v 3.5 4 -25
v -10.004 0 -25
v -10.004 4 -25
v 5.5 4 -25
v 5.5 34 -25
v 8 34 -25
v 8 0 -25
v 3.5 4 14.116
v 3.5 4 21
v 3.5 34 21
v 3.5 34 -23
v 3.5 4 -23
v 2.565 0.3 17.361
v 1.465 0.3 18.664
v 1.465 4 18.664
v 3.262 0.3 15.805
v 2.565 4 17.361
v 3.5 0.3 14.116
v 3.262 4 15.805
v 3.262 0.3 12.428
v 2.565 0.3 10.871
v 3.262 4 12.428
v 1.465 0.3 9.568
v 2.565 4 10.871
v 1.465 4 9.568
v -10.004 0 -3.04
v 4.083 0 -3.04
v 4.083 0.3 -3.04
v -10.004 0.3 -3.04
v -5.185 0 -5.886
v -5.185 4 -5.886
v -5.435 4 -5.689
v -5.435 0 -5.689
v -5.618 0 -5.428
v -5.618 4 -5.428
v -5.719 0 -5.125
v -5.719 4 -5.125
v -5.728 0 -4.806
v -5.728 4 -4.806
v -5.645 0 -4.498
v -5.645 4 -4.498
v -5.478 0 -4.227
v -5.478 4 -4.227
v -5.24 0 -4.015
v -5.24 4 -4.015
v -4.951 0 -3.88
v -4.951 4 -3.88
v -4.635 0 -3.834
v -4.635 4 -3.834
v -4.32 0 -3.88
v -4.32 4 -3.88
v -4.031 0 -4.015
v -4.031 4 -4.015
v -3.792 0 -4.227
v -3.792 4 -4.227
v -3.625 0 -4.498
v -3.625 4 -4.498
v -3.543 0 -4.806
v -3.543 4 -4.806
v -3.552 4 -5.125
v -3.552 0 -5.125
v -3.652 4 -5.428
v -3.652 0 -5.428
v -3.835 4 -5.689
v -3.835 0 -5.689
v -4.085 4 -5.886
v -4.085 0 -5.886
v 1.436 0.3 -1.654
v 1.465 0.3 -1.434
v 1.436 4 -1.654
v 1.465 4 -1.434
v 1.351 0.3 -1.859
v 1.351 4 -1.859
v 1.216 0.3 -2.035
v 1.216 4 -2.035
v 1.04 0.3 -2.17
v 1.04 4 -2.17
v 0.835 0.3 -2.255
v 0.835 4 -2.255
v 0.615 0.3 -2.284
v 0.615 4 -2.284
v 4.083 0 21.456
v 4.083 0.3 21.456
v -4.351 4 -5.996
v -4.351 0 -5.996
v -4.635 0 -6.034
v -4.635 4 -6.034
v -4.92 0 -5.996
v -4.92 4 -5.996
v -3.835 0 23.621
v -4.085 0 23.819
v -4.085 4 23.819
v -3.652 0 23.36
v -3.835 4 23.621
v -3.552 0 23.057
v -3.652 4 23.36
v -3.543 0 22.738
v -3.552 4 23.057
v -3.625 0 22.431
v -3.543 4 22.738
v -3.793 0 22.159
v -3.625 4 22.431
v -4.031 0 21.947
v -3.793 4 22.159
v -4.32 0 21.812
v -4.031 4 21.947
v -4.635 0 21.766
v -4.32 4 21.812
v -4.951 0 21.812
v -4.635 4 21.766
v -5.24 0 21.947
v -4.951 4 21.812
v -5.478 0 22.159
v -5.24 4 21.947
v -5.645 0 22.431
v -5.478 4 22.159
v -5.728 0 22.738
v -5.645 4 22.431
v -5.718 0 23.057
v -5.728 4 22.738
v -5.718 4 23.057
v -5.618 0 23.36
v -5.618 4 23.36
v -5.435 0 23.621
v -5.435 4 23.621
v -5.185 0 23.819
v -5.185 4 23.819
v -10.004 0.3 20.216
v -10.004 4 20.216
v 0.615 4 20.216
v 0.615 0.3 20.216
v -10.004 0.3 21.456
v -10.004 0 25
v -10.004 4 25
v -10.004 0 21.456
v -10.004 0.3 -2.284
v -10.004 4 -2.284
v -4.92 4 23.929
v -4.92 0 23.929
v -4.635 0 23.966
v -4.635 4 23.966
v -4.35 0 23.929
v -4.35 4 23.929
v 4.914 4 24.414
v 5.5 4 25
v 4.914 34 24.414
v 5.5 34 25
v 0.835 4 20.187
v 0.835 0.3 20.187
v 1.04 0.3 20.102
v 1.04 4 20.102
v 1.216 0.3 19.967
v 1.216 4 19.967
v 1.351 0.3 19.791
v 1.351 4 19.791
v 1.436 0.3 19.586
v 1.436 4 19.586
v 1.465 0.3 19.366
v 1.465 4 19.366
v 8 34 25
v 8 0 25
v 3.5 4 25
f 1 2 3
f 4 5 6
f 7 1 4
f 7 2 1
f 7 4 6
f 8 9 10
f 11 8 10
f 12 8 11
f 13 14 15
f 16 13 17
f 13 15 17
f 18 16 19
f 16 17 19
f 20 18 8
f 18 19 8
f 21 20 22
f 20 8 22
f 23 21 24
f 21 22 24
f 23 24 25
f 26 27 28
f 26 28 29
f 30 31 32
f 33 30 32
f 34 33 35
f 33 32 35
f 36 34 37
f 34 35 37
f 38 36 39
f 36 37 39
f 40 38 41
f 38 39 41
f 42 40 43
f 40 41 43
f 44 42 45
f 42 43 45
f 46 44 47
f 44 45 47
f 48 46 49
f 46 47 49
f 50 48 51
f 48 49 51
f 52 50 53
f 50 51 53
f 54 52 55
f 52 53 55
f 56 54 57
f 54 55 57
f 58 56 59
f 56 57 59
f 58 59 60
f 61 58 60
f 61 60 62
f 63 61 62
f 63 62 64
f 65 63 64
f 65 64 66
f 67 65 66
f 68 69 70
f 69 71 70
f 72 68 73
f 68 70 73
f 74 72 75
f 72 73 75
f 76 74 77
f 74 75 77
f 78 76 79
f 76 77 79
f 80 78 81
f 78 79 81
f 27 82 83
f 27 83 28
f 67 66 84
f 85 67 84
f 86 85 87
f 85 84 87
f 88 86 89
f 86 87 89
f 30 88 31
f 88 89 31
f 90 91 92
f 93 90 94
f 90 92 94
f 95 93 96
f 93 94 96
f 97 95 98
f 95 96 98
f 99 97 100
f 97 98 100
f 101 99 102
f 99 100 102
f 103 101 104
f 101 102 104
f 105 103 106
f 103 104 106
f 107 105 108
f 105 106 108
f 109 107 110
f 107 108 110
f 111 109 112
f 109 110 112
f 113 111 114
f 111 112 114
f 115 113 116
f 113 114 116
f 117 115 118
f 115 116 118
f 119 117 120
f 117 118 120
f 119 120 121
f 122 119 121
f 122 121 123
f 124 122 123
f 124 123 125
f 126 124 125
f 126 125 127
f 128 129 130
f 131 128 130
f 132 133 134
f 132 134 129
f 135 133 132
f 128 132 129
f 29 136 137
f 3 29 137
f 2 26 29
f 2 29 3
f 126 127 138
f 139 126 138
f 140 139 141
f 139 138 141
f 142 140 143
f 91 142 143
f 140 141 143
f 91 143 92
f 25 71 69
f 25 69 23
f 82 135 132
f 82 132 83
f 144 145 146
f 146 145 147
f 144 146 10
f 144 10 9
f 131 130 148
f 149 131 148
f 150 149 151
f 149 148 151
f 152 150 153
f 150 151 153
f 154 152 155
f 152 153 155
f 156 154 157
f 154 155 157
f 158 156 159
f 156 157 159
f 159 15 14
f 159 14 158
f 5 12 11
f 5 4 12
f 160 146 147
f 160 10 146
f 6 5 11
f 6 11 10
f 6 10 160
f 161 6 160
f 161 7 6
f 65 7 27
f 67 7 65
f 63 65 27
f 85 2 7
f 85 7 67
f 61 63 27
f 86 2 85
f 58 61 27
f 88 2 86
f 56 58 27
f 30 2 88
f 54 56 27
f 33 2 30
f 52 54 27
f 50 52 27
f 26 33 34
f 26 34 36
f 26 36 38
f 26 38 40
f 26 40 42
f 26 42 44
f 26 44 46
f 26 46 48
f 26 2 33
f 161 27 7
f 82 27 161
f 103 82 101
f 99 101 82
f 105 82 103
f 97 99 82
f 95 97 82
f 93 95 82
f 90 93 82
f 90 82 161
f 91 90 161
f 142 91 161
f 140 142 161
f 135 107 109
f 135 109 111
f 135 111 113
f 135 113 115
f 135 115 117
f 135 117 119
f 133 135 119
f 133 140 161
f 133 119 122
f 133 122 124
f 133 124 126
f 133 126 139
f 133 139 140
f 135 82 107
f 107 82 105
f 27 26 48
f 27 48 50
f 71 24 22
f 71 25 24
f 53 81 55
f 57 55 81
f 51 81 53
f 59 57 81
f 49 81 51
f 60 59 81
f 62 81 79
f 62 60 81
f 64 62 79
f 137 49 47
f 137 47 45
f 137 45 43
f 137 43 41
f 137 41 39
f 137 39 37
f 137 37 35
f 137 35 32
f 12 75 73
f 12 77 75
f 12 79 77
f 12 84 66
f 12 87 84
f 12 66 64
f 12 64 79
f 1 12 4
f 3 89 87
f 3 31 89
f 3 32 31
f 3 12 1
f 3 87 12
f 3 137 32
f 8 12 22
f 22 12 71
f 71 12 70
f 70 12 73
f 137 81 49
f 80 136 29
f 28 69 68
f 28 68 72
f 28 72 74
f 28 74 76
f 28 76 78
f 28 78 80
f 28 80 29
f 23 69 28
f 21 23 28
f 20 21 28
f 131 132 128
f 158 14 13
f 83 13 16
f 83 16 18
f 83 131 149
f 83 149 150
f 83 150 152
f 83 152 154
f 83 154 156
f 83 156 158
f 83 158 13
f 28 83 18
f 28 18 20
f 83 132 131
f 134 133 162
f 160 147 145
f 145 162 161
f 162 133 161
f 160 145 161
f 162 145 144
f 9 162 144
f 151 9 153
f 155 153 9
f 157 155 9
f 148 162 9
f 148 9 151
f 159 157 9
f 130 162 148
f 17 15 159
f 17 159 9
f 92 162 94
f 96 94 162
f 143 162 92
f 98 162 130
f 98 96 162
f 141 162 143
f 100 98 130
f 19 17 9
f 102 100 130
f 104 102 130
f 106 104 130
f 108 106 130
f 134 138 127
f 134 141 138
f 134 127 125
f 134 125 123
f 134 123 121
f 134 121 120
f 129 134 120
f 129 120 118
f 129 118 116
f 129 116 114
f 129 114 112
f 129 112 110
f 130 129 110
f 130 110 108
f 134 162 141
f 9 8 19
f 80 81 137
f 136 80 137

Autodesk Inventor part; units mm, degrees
ref_plane "YZ Plane" through (0, 0, 0) normal (1, 0, 0) x (0, 1, 0)
ref_plane "XZ Plane" through (0, 0, 0) normal (0, 1, 0) x (-1, 0, 0)
ref_plane "XY Plane" through (0, 0, 0) normal (0, 0, 1) x (1, 0, 0)
sketch "Эскиз1" plane through (0, 0, 0) normal (0, 1, 0) x (-1, 0, 0)
  line L0 (0, 0) -> (0, -20)
  circle A0 centre (0, -20) radius 2
  line L1 (-3.5, 25) -> (3.5, 25)
  line L2 (3.5, 25) -> (3.5, -25)
  line L3 (3.5, -25) -> (-3.5, -25)
  line L4 (-3.5, -25) -> (-3.5, 25)
  line L5 (-3.5, 25) -> (3.5, -25) construction
  line L6 (3.5, 25) -> (-3.5, -25) construction
  line L7 (0, 0) -> (0, 20)
  circle A1 centre (0, 20) radius 2
  dimension "d0" = 20
  dimension "d1" = 4
  dimension "d2" = 7
  dimension "d3" = 50
  dimension "d4" = 20
  dimension "d5" = 4
extrude "Выдавливание1" add sketch "Эскиз1" along normal blind 4 contours A0 | L1 L2 L3 L4 | A1
sketch "Эскиз2" plane through (3.5, 0, 25) normal (1, 0, 0) x (0, 0, -1)
  line L0 (50, 0) -> (0, 0) projected
  line L1 (0, 4) -> (50, 4)
  line L2 (50, 4) -> (50, 0)
  line L3 (50, 0) -> (0, 0)
  line L4 (0, 0) -> (0, 4)
  point P0 (25, 0)
extrude "Выдавливание2" add sketch "Эскиз2" along normal blind 7
sketch "Эскиз3" plane through (0, 4, 0) normal (0, 1, 0) x (1, 0, 0)
  line L0 (-3.5, -25) -> (10.5, -25) projected
  line L1 (-3.5, 25) -> (10.5, 25) projected
  line L2 (10.5, -25) -> (3.5, -25)
  line L3 (3.5, -25) -> (3.5, 25)
  line L4 (3.5, 25) -> (10.5, 25)
  line L5 (10.5, 25) -> (10.5, -25)
  point P0 (0, 0)
  dimension "d10" = 7
extrude "Выдавливание3" add sketch "Эскиз3" along normal blind 30
sketch "Эскиз5" plane through (0, 4, 0) normal (0, 1, 0) x (1, 0, 0)
  line L0 (-7.5352, -8.6362) -> (-7.5352, -8.5162)
  arc A0 (-1.7352, -8.5162) -> (-7.5352, -8.5162) centre (-4.6352, -8.5162) ccw
  line L1 (-1.7352, -8.5162) -> (-1.7352, -8.6362)
  arc A1 (1.3648, -12.5541) -> (-1.7352, -8.6362) centre (-4.6352, -14.1162) ccw
  line L2 (1.3648, -12.5541) -> (1.3648, 1.4338)
  arc A2 (1.3648, 1.4338) -> (0.6148, 2.1838) centre (0.6148, 1.4338) ccw
  line L3 (0.6148, 2.1838) -> (-9.8852, 2.1838)
  arc A3 (-9.8852, 2.1838) -> (-10.6352, 1.4338) centre (-9.8852, 1.4338) ccw
  line L4 (-10.6352, 1.4338) -> (-10.6352, -12.5541)
  arc A4 (-7.5352, -8.6362) -> (-10.6352, -12.5541) centre (-4.6352, -14.1162) ccw
  line L5 (0.4648, -4.2162) -> (0.4648, 0.7838)
  arc A5 (-0.0352, -4.7162) -> (0.4648, -4.2162) centre (-0.0352, -4.2162) ccw
  line L6 (-9.2352, -4.7162) -> (-0.0352, -4.7162)
  arc A6 (-9.7352, -4.2162) -> (-9.2352, -4.7162) centre (-9.2352, -4.2162) ccw
  line L7 (-9.7352, 0.7838) -> (-9.7352, -4.2162)
  arc A7 (-9.2352, 1.2838) -> (-9.7352, 0.7838) centre (-9.2352, 0.7838) ccw
  line L8 (-0.0352, 1.2838) -> (-9.2352, 1.2838)
  arc A8 (0.4648, 0.7838) -> (-0.0352, 1.2838) centre (-0.0352, 0.7838) ccw
  arc A9 (-5.1852, 5.8865) -> (-4.0852, 5.8865) centre (-4.6352, 4.9338) ccw
  line L9 (-5.1852, 7.0838) -> (-5.1852, 5.8865)
  line L10 (-5.1852, 7.0838) -> (-9.8852, 7.0838)
  arc A10 (-9.8852, 7.0838) -> (-10.7352, 6.2338) centre (-9.8852, 6.2338) ccw
  line L11 (-10.7352, 6.2338) -> (-10.7352, 1.4338)
  arc A11 (-9.8852, 2.2838) -> (-10.7352, 1.4338) centre (-9.8852, 1.4338) ccw
  line L12 (0.6148, 2.2838) -> (-9.8852, 2.2838)
  arc A12 (1.4648, 1.4338) -> (0.6148, 2.2838) centre (0.6148, 1.4338) ccw
  line L13 (1.4648, 1.4338) -> (1.4648, 6.2338)
  arc A13 (1.4648, 6.2338) -> (0.6148, 7.0838) centre (0.6148, 6.2338) ccw
  line L14 (0.6148, 7.0838) -> (-4.0852, 7.0838)
  line L15 (-4.0852, 5.8865) -> (-4.0852, 7.0838)
  line L16 (-9.8852, -25.0162) -> (-5.1852, -25.0162)
  line L17 (-5.1852, -23.8188) -> (-5.1852, -25.0162)
  arc A14 (-4.0852, -23.8188) -> (-5.1852, -23.8188) centre (-4.6352, -22.8662) ccw
  line L18 (-4.0852, -25.0162) -> (-4.0852, -23.8188)
  line L19 (-4.0852, -25.0162) -> (0.6148, -25.0162)
  arc A15 (0.6148, -25.0162) -> (1.4648, -24.1662) centre (0.6148, -24.1662) ccw
  line L20 (1.4648, -24.1662) -> (1.4648, -19.3662)
  arc A16 (0.6148, -20.2162) -> (1.4648, -19.3662) centre (0.6148, -19.3662) ccw
  line L21 (-9.8852, -20.2162) -> (0.6148, -20.2162)
  arc A17 (-10.7352, -19.3662) -> (-9.8852, -20.2162) centre (-9.8852, -19.3662) ccw
  line L22 (-10.7352, -19.3662) -> (-10.7352, -24.1662)
  arc A18 (-10.7352, -24.1662) -> (-9.8852, -25.0162) centre (-9.8852, -24.1662) ccw
  line L23 (-10.7352, -19.3662) -> (-10.7352, -15.6782)
  line L24 (-10.7352, -12.5541) -> (-10.7352, -14.1162)
  line L25 (-10.7352, -14.1162) -> (-10.7352, -15.6782)
  line L26 (-10.7352, -12.5541) -> (-10.7352, 1.4338)
  line L27 (1.4648, 1.4338) -> (1.4648, -12.5541)
  line L28 (1.4648, -15.6782) -> (1.4648, -19.3662)
  line L29 (1.4648, -15.6782) -> (1.4648, -14.1162)
  line L30 (1.4648, -14.1162) -> (1.4648, -12.5541)
  arc A19 (-10.6352, -15.6782) -> (-6.1972, -20.1162) centre (-4.6352, -14.1162) ccw
  line L31 (-10.6352, -15.6782) -> (-10.6352, -19.3662)
  arc A20 (-10.6352, -19.3662) -> (-9.8852, -20.1162) centre (-9.8852, -19.3662) ccw
  line L32 (-9.8852, -20.1162) -> (-6.1972, -20.1162)
  line L33 (1.3648, -19.3662) -> (1.3648, -15.6782)
  arc A21 (-3.0731, -20.1162) -> (1.3648, -15.6782) centre (-4.6352, -14.1162) ccw
  line L34 (-3.0731, -20.1162) -> (0.6148, -20.1162)
  arc A22 (0.6148, -20.1162) -> (1.3648, -19.3662) centre (0.6148, -19.3662) ccw
  circle A23 centre (-4.6352, 4.9338) radius 1.1
  line L35 (-5.1852, 5.8865) -> (-5.1852, 7.0838)
  line L36 (-4.0852, 7.0838) -> (-5.1852, 7.0838)
  circle A24 centre (-4.6352, -22.8662) radius 1.1
  line L37 (-5.1852, -25.0162) -> (-5.1852, -23.8188)
  line L38 (-4.0852, -25.0162) -> (-5.1852, -25.0162)
  circle A25 centre (-4.6352, -14.1162) radius 0.8
  line L39 (-3.5, 25) -> (3.5, 25) projected
  line L40 (-13.5, 25) -> (-13.5, -25)
  line L41 (-13.5, -25) -> (-3.5, -25)
  line L42 (-3.5, -25) -> (-3.5, 25)
  point P0 (0, 0)
  point P1 (-4.6352, -8.9662)
  dimension "d16" = 10
extrude "Выдавливание5" cut sketch "Эскиз5" against normal blind 10 contours A4 L4 A3 L3 L42 L8 A7 L7 A6 L6 A0 L0 | L0 A0 L42 L21 A17 L23 L25 L24 L26 A11 L12 L3 A3 L4 A4 | L42 L6 A5 L5 A8 L8 L3 A2 L2 A1 L1 A0 | A0 L1 A1 L2 A2 L3 L42 L12 A12 L27 L30 L29 L28 A16 L21 | L42 L8 A8 L5 A5 L6 | L6 A6 L7 A7 L8 L42 | A19 L32 A20 L31 | A22 L34 A21 L33 | A25
move faces "Перенос1" translate (-6.504, 0, 0) faces at (-3.5, 2.6667, -9.8559) (-3.5, 1.3333, 23.4054)
sketch "Эскиз6" plane through (0, 4, 0) normal (0, 1, 0) x (1, 0, 0)
  arc A0 (1.4648, -18.6645) -> (1.4648, -9.5679) centre (-2.6, -14.1162) ccw
  line L0 (1.4648, -9.5679) -> (1.4648, -19.3662)
  point P0 (0, 0)
  point P1 (0.2532, -8.7246)
  point P2 (-5.4532, -8.7246)
extrude "Выдавливание6" cut sketch "Эскиз6" against normal blind 7
sketch "Эскиз7" plane through (0, 0, 0) normal (0, -1, 0) x (1, 0, 0)
  line L0 (-10.004, 25) -> (-10.004, 20.2162) projected
  line L1 (-10.004, 21.4561) -> (4.0826, 21.4561)
  line L2 (4.0826, 21.4561) -> (4.0826, -3.0396)
  line L3 (4.0826, -3.0396) -> (-10.004, -3.0396)
  line L4 (-10.004, -3.0396) -> (-10.004, 21.4561)
  point P0 (0, 0)
extrude "Выдавливание7" cut sketch "Эскиз7" against normal blind 0.3
sketch "Эскиз8" plane through (0, 4, 0) normal (0, 1, 0) x (1, 0, 0)
  line L0 (-7.5352, -8.6362) -> (-7.5352, -8.5162)
  arc A0 (-1.7352, -8.5162) -> (-7.5352, -8.5162) centre (-4.6352, -8.5162) ccw
  line L1 (-1.7352, -8.5162) -> (-1.7352, -8.6362)
  arc A1 (1.3648, -12.5541) -> (-1.7352, -8.6362) centre (-4.6352, -14.1162) ccw
  line L2 (1.3648, -12.5541) -> (1.3648, 1.4338)
  arc A2 (1.3648, 1.4338) -> (0.6148, 2.1838) centre (0.6148, 1.4338) ccw
  line L3 (0.6148, 2.1838) -> (-9.8852, 2.1838)
  arc A3 (-9.8852, 2.1838) -> (-10.6352, 1.4338) centre (-9.8852, 1.4338) ccw
  line L4 (-10.6352, 1.4338) -> (-10.6352, -12.5541)
  arc A4 (-7.5352, -8.6362) -> (-10.6352, -12.5541) centre (-4.6352, -14.1162) ccw
  line L5 (0.4648, -4.2162) -> (0.4648, 0.7838)
  arc A5 (-0.0352, -4.7162) -> (0.4648, -4.2162) centre (-0.0352, -4.2162) ccw
  line L6 (-9.2352, -4.7162) -> (-0.0352, -4.7162)
  arc A6 (-9.7352, -4.2162) -> (-9.2352, -4.7162) centre (-9.2352, -4.2162) ccw
  line L7 (-9.7352, 0.7838) -> (-9.7352, -4.2162)
  arc A7 (-9.2352, 1.2838) -> (-9.7352, 0.7838) centre (-9.2352, 0.7838) ccw
  line L8 (-0.0352, 1.2838) -> (-9.2352, 1.2838)
  arc A8 (0.4648, 0.7838) -> (-0.0352, 1.2838) centre (-0.0352, 0.7838) ccw
  arc A9 (-5.1852, 5.8865) -> (-4.0852, 5.8865) centre (-4.6352, 4.9338) ccw
  line L9 (-5.1852, 7.0838) -> (-5.1852, 5.8865)
  line L10 (-5.1852, 7.0838) -> (-9.8852, 7.0838)
  arc A10 (-9.8852, 7.0838) -> (-10.7352, 6.2338) centre (-9.8852, 6.2338) ccw
  line L11 (-10.7352, 6.2338) -> (-10.7352, 1.4338)
  arc A11 (-9.8852, 2.2838) -> (-10.7352, 1.4338) centre (-9.8852, 1.4338) ccw
  line L12 (0.6148, 2.2838) -> (-9.8852, 2.2838)
  arc A12 (1.4648, 1.4338) -> (0.6148, 2.2838) centre (0.6148, 1.4338) ccw
  line L13 (1.4648, 1.4338) -> (1.4648, 6.2338)
  arc A13 (1.4648, 6.2338) -> (0.6148, 7.0838) centre (0.6148, 6.2338) ccw
  line L14 (0.6148, 7.0838) -> (-4.0852, 7.0838)
  line L15 (-4.0852, 5.8865) -> (-4.0852, 7.0838)
  line L16 (-9.8852, -25.0162) -> (-5.1852, -25.0162)
  line L17 (-5.1852, -23.8188) -> (-5.1852, -25.0162)
  arc A14 (-4.0852, -23.8188) -> (-5.1852, -23.8188) centre (-4.6352, -22.8662) ccw
  line L18 (-4.0852, -25.0162) -> (-4.0852, -23.8188)
  line L19 (-4.0852, -25.0162) -> (0.6148, -25.0162)
  arc A15 (0.6148, -25.0162) -> (1.4648, -24.1662) centre (0.6148, -24.1662) ccw
  line L20 (1.4648, -24.1662) -> (1.4648, -19.3662)
  arc A16 (0.6148, -20.2162) -> (1.4648, -19.3662) centre (0.6148, -19.3662) ccw
  line L21 (-9.8852, -20.2162) -> (0.6148, -20.2162)
  arc A17 (-10.7352, -19.3662) -> (-9.8852, -20.2162) centre (-9.8852, -19.3662) ccw
  line L22 (-10.7352, -19.3662) -> (-10.7352, -24.1662)
  arc A18 (-10.7352, -24.1662) -> (-9.8852, -25.0162) centre (-9.8852, -24.1662) ccw
  line L23 (-10.7352, -19.3662) -> (-10.7352, -15.6782)
  line L24 (-10.7352, -12.5541) -> (-10.7352, -14.1162)
  line L25 (-10.7352, -14.1162) -> (-10.7352, -15.6782)
  line L26 (-10.7352, -12.5541) -> (-10.7352, 1.4338)
  line L27 (1.4648, 1.4338) -> (1.4648, -12.5541)
  line L28 (1.4648, -15.6782) -> (1.4648, -19.3662)
  line L29 (1.4648, -15.6782) -> (1.4648, -14.1162)
  line L30 (1.4648, -14.1162) -> (1.4648, -12.5541)
  arc A19 (-10.6352, -15.6782) -> (-6.1972, -20.1162) centre (-4.6352, -14.1162) ccw
  line L31 (-10.6352, -15.6782) -> (-10.6352, -19.3662)
  arc A20 (-10.6352, -19.3662) -> (-9.8852, -20.1162) centre (-9.8852, -19.3662) ccw
  line L32 (-9.8852, -20.1162) -> (-6.1972, -20.1162)
  line L33 (1.3648, -19.3662) -> (1.3648, -15.6782)
  arc A21 (-3.0731, -20.1162) -> (1.3648, -15.6782) centre (-4.6352, -14.1162) ccw
  line L34 (-3.0731, -20.1162) -> (0.6148, -20.1162)
  arc A22 (0.6148, -20.1162) -> (1.3648, -19.3662) centre (0.6148, -19.3662) ccw
  circle A23 centre (-4.6352, 4.9338) radius 1.1
  line L35 (-5.1852, 5.8865) -> (-5.1852, 7.0838)
  line L36 (-4.0852, 7.0838) -> (-5.1852, 7.0838)
  circle A24 centre (-4.6352, -22.8662) radius 1.1
  line L37 (-5.1852, -25.0162) -> (-5.1852, -23.8188)
  line L38 (-4.0852, -25.0162) -> (-5.1852, -25.0162)
  circle A25 centre (-4.6352, -14.1162) radius 0.8
  line L39 (-3.5, 25) -> (3.5, 25)
  line L40 (-13.5, 25) -> (-13.5, -25)
  line L41 (-13.5, -25) -> (-3.5, -25)
  line L42 (-3.5, -25) -> (-3.5, 25)
  point P0 (0, 0)
  point P1 (0, 0)
  point P2 (-4.6352, -8.9662)
  dimension "d26" = 10
extrude "Выдавливание8" cut sketch "Эскиз8" against normal through all contours A24 A14 | A9 A23
move faces "Перенос2" translate (-2.5, 0, 0) faces at (10.5, 11.3333, -8.3333)
chamfer "Фаска1" distance 2 angle 45 2 edges at (3.5, 19, 25) (3.5, 19, -25)
chamfer "Фаска2" distance 2 angle 45 1 edges at (3.5, 19, 23)
properties part number "000.705 - Пассивный прижим"
